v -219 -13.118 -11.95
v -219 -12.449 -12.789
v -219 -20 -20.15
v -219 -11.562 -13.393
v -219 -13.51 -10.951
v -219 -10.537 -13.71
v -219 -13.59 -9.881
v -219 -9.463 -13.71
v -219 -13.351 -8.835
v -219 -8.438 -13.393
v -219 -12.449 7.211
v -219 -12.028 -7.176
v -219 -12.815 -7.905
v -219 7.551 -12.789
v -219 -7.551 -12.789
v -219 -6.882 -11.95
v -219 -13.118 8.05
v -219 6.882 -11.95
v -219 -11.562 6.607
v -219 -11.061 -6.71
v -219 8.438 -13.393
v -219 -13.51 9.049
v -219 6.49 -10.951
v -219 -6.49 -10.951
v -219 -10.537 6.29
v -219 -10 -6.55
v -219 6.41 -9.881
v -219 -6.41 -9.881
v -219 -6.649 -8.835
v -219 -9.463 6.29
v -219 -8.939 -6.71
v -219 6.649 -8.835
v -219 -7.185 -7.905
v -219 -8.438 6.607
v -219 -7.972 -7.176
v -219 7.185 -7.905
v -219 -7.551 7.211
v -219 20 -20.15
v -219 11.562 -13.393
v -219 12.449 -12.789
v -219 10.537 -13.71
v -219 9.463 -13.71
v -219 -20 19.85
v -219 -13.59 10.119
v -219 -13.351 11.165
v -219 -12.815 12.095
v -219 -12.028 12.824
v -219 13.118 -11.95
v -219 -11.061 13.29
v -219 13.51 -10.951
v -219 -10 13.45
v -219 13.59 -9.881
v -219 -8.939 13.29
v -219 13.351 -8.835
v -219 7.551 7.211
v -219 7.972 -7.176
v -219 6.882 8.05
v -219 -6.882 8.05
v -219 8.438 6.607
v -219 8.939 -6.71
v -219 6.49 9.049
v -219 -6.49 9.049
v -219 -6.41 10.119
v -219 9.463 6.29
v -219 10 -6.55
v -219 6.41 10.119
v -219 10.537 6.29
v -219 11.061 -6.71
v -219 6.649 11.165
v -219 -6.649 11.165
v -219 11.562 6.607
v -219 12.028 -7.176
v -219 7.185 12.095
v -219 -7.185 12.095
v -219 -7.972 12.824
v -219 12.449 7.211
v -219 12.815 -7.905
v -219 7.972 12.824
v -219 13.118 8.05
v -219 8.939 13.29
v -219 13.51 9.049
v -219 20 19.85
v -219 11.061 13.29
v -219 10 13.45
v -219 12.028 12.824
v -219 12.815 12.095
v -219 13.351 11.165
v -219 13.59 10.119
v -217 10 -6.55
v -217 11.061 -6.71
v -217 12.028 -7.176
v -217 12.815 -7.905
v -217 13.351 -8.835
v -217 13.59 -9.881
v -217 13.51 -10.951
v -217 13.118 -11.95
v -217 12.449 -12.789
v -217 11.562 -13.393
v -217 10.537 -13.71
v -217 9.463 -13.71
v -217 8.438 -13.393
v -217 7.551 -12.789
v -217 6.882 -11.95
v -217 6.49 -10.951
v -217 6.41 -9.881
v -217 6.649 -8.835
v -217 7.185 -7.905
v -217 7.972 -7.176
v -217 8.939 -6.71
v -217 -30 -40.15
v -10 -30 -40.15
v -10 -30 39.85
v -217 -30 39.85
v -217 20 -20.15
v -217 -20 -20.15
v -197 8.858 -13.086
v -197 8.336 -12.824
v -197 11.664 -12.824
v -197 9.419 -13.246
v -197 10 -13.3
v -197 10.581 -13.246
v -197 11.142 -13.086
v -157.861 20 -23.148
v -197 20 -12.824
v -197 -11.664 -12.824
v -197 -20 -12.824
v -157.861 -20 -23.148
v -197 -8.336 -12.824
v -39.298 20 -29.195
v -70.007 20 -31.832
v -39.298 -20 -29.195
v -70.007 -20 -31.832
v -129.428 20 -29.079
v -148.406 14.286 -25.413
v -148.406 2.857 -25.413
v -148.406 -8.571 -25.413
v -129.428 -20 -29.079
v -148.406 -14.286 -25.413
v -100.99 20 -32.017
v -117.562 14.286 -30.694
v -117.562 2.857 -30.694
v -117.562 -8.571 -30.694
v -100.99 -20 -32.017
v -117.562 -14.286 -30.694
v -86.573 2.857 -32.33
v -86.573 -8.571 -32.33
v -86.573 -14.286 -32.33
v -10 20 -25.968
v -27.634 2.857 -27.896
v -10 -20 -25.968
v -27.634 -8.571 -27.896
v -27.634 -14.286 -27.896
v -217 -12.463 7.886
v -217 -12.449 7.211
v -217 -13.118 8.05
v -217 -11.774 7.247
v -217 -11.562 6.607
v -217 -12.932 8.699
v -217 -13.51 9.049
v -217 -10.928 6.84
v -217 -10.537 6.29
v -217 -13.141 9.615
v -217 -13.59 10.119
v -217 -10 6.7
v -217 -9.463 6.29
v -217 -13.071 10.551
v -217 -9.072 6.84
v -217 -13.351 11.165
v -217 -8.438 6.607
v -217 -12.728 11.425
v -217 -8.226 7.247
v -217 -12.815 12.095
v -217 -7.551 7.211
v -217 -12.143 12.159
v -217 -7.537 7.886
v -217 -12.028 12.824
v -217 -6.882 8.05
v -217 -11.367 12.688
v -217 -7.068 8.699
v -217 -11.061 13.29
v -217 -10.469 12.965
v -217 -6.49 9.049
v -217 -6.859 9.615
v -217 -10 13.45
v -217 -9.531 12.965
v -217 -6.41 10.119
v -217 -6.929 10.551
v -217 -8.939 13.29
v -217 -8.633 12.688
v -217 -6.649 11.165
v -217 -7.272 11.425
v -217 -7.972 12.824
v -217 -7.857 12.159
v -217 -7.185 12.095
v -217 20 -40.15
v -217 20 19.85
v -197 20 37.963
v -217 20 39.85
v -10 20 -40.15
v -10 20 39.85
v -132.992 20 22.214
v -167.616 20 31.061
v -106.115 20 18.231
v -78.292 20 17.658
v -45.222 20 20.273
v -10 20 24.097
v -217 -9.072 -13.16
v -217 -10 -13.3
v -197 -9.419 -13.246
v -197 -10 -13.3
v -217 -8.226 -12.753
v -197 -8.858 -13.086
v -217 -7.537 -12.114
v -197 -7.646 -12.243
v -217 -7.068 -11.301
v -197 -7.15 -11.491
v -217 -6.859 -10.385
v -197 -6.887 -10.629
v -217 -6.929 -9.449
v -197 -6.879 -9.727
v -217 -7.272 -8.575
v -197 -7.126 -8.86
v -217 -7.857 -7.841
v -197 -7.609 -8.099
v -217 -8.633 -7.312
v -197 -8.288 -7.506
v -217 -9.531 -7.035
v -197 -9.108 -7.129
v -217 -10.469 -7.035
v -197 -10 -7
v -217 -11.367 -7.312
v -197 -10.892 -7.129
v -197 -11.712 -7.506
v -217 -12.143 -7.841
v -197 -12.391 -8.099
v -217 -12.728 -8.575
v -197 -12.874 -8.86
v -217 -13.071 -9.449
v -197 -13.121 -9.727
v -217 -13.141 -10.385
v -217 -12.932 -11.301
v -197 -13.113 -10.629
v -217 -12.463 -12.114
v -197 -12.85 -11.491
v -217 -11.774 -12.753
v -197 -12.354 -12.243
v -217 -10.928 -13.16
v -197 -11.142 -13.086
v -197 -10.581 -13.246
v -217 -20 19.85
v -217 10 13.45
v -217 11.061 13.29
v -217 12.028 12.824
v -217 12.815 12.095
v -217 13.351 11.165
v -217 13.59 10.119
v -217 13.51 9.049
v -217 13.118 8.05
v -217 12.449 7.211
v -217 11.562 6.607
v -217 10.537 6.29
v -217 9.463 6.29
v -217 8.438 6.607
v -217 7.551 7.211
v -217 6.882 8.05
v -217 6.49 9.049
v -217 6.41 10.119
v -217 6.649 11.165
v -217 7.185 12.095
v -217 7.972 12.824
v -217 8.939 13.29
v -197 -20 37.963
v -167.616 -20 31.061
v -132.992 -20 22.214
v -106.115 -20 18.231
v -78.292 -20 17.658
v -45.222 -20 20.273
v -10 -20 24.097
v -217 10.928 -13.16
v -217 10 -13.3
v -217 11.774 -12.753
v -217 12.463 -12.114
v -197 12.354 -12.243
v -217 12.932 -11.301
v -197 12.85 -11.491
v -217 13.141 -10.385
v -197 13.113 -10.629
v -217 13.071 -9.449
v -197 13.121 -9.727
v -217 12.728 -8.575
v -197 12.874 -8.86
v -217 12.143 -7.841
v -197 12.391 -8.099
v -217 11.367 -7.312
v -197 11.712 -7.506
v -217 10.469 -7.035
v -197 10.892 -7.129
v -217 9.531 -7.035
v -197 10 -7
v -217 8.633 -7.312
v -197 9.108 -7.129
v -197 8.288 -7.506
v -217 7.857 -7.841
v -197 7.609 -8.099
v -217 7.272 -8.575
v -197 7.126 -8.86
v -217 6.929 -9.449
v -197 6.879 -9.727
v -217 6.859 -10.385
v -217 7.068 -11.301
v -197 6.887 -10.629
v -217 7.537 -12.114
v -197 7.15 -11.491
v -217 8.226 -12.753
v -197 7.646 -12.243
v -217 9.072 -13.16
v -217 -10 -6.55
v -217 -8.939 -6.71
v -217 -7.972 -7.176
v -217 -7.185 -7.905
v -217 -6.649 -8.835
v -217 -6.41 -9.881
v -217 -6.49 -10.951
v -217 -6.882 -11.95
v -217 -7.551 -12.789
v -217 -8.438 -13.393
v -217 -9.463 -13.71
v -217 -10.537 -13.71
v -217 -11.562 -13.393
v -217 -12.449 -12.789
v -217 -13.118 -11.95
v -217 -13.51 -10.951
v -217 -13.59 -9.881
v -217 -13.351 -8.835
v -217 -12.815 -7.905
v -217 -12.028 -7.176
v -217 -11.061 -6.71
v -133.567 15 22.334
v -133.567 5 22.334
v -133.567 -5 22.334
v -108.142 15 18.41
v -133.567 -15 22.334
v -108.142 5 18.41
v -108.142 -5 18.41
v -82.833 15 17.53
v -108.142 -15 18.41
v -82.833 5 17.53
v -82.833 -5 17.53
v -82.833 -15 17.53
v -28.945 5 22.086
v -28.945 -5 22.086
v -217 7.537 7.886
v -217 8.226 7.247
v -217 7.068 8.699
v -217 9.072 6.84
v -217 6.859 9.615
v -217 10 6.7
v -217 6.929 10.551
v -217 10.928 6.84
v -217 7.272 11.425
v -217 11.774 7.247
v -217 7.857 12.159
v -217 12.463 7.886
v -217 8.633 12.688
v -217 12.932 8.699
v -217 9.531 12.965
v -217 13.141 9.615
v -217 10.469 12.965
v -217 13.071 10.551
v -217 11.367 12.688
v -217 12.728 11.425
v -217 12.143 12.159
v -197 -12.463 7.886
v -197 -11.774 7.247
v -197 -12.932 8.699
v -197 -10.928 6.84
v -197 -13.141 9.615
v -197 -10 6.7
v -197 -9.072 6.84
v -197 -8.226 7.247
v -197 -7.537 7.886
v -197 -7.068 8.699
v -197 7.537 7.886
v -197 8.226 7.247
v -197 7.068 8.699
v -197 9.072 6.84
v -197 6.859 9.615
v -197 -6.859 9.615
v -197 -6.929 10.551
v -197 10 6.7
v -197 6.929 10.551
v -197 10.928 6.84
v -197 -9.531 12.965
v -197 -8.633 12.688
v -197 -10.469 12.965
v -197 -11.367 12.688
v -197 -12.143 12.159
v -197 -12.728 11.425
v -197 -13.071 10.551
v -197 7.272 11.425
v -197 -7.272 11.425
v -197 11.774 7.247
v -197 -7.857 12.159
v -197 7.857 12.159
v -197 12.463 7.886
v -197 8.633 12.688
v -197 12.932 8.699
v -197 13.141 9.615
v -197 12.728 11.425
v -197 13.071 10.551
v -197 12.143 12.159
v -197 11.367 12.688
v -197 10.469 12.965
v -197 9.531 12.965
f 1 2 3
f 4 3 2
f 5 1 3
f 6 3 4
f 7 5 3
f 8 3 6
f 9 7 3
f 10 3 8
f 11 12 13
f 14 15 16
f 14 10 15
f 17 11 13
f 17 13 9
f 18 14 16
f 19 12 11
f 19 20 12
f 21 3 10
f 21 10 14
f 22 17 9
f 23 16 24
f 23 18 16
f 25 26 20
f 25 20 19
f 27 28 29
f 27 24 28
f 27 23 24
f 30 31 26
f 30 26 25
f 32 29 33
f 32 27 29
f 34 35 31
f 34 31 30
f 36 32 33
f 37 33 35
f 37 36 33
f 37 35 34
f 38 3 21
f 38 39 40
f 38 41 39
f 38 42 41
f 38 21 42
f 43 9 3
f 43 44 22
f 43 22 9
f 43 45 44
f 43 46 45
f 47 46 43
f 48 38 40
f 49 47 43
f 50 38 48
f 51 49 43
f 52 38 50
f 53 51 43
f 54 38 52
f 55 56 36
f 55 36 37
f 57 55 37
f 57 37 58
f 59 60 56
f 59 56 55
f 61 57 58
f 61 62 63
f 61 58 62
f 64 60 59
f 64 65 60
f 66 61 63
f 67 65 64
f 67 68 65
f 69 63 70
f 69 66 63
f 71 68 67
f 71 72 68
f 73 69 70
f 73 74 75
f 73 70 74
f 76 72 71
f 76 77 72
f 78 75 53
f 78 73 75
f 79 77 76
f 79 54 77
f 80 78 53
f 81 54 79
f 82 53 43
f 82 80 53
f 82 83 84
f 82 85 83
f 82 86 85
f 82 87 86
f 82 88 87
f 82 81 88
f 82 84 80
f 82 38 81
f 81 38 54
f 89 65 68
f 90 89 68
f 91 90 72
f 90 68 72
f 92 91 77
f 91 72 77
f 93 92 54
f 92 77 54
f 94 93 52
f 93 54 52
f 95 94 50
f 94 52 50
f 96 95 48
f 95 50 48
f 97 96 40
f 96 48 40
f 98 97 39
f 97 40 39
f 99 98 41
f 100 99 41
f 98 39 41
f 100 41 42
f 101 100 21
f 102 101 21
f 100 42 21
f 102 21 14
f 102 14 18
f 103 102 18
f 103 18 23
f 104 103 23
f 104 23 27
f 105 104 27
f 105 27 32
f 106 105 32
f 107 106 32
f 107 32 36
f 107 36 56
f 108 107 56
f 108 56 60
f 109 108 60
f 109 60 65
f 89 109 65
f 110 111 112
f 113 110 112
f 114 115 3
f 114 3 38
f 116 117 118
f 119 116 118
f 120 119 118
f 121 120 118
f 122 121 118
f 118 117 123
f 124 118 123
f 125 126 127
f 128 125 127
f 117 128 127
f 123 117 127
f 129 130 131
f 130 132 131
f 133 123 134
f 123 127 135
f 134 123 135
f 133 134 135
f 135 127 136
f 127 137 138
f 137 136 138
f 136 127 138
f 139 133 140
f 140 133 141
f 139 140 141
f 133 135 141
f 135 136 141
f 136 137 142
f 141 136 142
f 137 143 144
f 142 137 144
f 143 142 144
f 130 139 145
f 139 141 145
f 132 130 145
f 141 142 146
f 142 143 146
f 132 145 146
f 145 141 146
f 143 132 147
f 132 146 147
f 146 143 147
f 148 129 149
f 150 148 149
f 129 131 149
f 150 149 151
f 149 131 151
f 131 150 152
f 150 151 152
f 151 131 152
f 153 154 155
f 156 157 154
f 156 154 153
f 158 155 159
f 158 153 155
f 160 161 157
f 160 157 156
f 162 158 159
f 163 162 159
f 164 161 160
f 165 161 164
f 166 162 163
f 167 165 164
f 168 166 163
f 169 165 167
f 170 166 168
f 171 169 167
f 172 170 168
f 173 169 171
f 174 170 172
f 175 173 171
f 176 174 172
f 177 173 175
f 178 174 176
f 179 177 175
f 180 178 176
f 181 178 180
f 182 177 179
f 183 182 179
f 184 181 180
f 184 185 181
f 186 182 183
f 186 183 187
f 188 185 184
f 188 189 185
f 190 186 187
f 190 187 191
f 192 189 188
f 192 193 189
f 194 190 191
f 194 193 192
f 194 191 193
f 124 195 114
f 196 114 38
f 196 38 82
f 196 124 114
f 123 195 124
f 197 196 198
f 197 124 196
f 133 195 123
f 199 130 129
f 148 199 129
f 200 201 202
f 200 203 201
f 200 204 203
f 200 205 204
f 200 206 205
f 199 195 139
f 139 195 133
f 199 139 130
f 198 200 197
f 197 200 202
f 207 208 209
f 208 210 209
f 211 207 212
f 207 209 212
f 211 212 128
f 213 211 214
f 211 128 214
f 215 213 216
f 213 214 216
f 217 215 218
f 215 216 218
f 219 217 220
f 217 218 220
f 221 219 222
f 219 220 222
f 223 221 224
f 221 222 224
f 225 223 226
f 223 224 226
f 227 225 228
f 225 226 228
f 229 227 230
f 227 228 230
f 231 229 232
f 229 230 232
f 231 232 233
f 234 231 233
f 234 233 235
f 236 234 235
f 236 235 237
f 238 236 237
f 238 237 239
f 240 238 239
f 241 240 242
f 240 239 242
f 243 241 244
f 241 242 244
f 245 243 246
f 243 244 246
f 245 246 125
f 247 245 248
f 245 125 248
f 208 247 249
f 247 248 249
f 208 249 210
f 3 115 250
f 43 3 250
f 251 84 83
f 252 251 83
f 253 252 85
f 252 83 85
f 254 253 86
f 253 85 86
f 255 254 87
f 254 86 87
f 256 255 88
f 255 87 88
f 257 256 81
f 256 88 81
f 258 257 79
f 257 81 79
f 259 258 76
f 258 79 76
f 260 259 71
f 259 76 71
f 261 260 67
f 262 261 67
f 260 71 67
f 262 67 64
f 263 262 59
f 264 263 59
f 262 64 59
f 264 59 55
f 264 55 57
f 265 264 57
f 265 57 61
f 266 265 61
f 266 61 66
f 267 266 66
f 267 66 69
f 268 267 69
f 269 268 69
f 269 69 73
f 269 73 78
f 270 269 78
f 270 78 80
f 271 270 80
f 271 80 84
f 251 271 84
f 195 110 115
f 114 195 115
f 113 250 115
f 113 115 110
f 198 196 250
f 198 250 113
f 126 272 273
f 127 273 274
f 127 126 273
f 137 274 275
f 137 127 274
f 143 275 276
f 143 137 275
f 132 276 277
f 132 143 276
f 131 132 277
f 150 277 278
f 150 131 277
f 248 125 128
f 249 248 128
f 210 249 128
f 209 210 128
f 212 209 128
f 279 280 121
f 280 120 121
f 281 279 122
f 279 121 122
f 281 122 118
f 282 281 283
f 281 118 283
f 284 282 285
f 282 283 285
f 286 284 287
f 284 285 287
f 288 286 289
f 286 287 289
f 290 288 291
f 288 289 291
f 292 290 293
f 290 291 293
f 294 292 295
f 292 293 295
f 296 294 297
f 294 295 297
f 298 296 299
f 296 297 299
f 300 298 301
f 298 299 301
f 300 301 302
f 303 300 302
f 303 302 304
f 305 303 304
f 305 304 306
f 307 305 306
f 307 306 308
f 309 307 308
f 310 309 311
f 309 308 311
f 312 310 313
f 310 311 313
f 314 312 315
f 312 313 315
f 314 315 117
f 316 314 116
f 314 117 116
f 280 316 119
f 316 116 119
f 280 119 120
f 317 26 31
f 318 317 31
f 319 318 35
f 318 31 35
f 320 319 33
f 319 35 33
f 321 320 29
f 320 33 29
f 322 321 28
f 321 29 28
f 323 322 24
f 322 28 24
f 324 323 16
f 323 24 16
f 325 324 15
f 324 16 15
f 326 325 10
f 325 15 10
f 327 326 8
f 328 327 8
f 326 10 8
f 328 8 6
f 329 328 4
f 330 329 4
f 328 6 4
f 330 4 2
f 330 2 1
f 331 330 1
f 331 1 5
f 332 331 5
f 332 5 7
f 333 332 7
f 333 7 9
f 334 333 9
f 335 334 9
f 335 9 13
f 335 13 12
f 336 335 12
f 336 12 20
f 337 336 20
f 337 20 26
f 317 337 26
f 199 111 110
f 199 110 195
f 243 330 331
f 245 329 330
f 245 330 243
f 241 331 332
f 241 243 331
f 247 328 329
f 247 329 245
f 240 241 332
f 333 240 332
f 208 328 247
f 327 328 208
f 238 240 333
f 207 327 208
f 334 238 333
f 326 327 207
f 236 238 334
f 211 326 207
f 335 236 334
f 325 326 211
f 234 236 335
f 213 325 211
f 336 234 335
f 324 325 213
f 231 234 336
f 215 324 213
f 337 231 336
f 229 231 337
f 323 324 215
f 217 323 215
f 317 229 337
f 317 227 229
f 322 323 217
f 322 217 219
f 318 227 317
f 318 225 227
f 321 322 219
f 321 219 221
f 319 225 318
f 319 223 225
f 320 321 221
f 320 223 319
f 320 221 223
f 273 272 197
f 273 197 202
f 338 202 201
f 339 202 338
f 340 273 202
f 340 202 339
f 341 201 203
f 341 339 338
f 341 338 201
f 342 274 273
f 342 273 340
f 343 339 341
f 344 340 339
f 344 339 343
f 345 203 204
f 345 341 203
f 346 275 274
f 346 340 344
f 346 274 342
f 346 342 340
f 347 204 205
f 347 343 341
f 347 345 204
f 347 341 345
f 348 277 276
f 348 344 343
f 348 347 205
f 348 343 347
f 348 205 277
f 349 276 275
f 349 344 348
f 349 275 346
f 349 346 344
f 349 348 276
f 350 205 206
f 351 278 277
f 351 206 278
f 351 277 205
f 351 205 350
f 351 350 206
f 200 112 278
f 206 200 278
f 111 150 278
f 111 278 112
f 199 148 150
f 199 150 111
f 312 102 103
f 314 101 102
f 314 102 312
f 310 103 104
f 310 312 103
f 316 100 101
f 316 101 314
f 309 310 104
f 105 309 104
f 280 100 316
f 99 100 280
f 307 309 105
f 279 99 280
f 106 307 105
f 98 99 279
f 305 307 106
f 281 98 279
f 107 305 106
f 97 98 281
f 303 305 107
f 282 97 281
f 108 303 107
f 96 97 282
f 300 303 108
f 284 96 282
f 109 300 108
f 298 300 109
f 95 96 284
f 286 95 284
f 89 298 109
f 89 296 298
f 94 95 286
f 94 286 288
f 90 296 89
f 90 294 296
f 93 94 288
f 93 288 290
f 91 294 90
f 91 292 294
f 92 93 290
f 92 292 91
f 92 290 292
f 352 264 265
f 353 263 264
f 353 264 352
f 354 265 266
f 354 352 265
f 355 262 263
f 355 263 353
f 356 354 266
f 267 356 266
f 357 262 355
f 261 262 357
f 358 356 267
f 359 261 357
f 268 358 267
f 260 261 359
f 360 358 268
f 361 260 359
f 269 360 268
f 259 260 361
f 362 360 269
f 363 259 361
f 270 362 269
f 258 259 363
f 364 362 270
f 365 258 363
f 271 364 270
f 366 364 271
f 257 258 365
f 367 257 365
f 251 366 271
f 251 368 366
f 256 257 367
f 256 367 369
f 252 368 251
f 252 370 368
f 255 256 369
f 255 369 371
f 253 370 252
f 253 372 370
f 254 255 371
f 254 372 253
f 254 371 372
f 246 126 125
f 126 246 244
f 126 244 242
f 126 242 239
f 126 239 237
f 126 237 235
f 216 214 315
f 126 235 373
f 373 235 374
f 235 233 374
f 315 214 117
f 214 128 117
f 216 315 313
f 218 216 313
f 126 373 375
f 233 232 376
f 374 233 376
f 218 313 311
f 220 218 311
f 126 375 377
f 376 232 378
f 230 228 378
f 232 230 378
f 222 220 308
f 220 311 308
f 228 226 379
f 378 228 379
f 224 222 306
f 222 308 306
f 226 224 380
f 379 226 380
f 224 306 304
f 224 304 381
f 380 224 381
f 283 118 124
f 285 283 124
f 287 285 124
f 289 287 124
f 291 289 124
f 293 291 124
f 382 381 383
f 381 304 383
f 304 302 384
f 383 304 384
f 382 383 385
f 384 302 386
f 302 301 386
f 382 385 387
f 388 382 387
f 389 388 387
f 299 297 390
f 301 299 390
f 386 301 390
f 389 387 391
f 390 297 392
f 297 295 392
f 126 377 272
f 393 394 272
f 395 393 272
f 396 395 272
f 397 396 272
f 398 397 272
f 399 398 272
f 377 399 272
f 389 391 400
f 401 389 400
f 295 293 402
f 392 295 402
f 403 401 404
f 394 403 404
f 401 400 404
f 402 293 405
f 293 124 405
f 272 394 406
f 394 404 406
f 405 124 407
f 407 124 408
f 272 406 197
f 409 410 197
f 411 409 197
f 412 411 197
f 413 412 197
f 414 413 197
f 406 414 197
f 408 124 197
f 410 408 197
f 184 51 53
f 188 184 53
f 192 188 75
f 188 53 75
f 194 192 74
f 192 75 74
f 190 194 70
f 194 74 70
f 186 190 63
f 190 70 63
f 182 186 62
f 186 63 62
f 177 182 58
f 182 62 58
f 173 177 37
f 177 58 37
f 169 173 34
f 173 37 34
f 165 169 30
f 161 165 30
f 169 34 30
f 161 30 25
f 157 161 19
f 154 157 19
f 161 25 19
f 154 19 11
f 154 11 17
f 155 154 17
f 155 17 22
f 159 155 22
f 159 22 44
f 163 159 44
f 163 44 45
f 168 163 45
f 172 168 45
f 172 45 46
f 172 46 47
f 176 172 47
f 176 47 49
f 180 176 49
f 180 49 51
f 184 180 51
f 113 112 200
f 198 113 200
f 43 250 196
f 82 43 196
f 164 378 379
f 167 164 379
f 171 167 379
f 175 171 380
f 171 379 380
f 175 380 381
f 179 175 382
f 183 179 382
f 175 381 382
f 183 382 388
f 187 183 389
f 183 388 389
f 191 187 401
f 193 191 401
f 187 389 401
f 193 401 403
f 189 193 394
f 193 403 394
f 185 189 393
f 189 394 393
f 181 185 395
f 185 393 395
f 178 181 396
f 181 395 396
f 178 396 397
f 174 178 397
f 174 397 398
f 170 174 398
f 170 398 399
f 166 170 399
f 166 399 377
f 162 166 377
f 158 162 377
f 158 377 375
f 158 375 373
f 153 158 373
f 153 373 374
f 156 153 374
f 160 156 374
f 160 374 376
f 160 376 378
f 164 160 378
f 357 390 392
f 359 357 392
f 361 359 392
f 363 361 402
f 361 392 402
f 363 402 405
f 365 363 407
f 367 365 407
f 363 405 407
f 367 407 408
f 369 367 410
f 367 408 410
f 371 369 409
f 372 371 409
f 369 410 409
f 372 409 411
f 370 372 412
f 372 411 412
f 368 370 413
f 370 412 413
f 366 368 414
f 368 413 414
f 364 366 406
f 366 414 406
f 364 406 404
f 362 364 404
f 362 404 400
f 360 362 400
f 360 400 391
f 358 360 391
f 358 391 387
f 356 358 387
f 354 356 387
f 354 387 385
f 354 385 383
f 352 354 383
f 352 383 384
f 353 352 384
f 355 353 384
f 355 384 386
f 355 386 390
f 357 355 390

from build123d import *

# Parameters (mm, degrees)
BOSS_EXTRUDE1_DEPTH      = 20
BOSS_EXTRUDE1_DEPTH_BACK = 30
CUT_SWEEP1_START         = -20
CUT_SWEEP1_DEPTH         = 40
SKETCH10_W               = 80
SKETCH10_H               = 50
BOSS_EXTRUDE2_DEPTH      = 20
SKETCH16_W               = 40
SKETCH16_H               = 40
BOSS_EXTRUDE3_DEPTH      = 2
HOLE2_D                  = 6.3
HOLE2_DEPTH              = 22
HOLE2_CBORE_D            = 7.2
HOLE2_CBORE_DEPTH        = 2
SKETCH21_W               = 80
SKETCH21_H               = 50
CUT_EXTRUDE1_DEPTH       = 10


# Read off the part's stored shape, not the designer's step: Cut-Sweep1
with BuildPart() as part:
    # Sketch4 → Boss-Extrude1 (new, two sides: drawn at the far end of the back side and taken through both)
    with BuildSketch(Plane(origin=(0, 0, 0), x_dir=(1, 0, 0), z_dir=(0, 1, 0)).offset(-BOSS_EXTRUDE1_DEPTH_BACK)):
        with BuildLine():
            Line((0, 40.15), (-197, 40.15))
            Line((-197, 40.15), (-197, -12.476031535))
            add(Edge.make_bspline(
                [(-197, -12.476031535), (-157.6, -4.723053252), (-118.2, 15.300441144), (-78.8, 10.012115501), (-39.4, 3.538400001), (0, 0.15)],
                knots=[0.083275556, 0.083275556, 0.083275556, 0.083275556, 0.083275556, 0.083275556, 0.916661414, 0.916661414, 0.916661414, 0.916661414, 0.916661414, 0.916661414], degree=5))
            Line((0, 0.15), (0, 40.15))
        make_face()
        with BuildLine():
            add(Edge.make_bspline(
                [(-197, -12.476031535), (-157.6, -4.723053252), (-118.2, 15.300441144), (-78.8, 10.012115501), (-39.4, 3.538400001), (0, 0.15)],
                knots=[0.083275556, 0.083275556, 0.083275556, 0.083275556, 0.083275556, 0.083275556, 0.916661414, 0.916661414, 0.916661414, 0.916661414, 0.916661414, 0.916661414], degree=5))
            Line((-197, -12.476031535), (-197, -39.85))
            Line((-197, -39.85), (0, -39.85))
            Line((0, -39.85), (0, 0.15))
        make_face()
    extrude(amount=BOSS_EXTRUDE1_DEPTH + BOSS_EXTRUDE1_DEPTH_BACK)

    # Cut-Sweep1 outline → Cut-Sweep1 (cut)
    with BuildSketch(Plane(origin=(0, 0, 0), x_dir=(1, 0, 0), z_dir=(0, 1, 0)).offset(CUT_SWEEP1_START)):
        with BuildLine():
            Line((-197, 12.824466259), (-197, -37.963170516))
            add(Edge.make_bspline(
                [(-197, -37.963170516), (-194.857076562, -37.593469155), (-192.664183232, -37.185688204), (-179.694008515, -34.512721603), (-169.755793181, -31.636726837), (-151.13880736, -26.524050167), (-142.164701345, -24.14456221), (-124.9697813, -20.524403523), (-116.494315107, -19.189461235), (-99.789682062, -17.631352392), (-91.362774073, -17.362930945), (-74.303075644, -17.69764349), (-65.556432968, -18.288800586), (-47.620430646, -19.955725203), (-38.405272349, -21.025808689), (-19.484749512, -23.146908776), (-9.824169485, -24.188286581), (0, -25)],
                knots=[0.098511652, 0.098511652, 0.098511652, 0.098511652, 0.124429736, 0.124429736, 0.248859471, 0.248859471, 0.373289207, 0.373289207, 0.497718942, 0.497718942, 0.622148678, 0.622148678, 0.746578413, 0.746578413, 0.871008149, 0.871008149, 0.995437884, 0.995437884, 0.995437884, 0.995437884], degree=3))
            Line((0, -25), (0, 25))
            add(Edge.make_bspline(
                [(-197, 12.824466259), (-190.953867766, 14.201157707), (-184.535853215, 15.951619244), (-168.3474788, 20.421519224), (-158.563360814, 23.118034358), (-138.248185708, 27.707878723), (-127.968743149, 29.521030359), (-107.155965698, 31.867257342), (-96.8180132, 32.368349134), (-76.327105621, 32.290986848), (-66.286644699, 31.713382561), (-46.616831507, 30.041717947), (-37.012970151, 28.954868939), (-18.255380676, 26.838041894), (-9.05748306, 25.811713394), (0, 25)],
                knots=[0.160277357, 0.160277357, 0.160277357, 0.160277357, 0.248859471, 0.248859471, 0.373289207, 0.373289207, 0.497718942, 0.497718942, 0.622148678, 0.622148678, 0.746578413, 0.746578413, 0.871008149, 0.871008149, 0.995437884, 0.995437884, 0.995437884, 0.995437884], degree=3))
        make_face()
    extrude(amount=CUT_SWEEP1_DEPTH, mode=Mode.SUBTRACT)

    # Sketch10 → Boss-Extrude2 (add)
    with BuildSketch(Plane.ZY.offset(197)):
        with Locations((-0.15, -5)):
            Rectangle(SKETCH10_W, SKETCH10_H)
    extrude(amount=BOSS_EXTRUDE2_DEPTH)

    # Sketch16 → Boss-Extrude3 (add)
    with BuildSketch(Plane.ZY.offset(217)):
        with Locations((-0.15, 0)):
            Rectangle(SKETCH16_W, SKETCH16_H)
    extrude(amount=BOSS_EXTRUDE3_DEPTH)

    # Hole2
    with Locations(Plane.ZY.offset(219)):
        with Locations((-10.15, 10), (9.85, 10), (-10.15, -10), (9.85, -10)):
            CounterBoreHole(HOLE2_D / 2, HOLE2_CBORE_D / 2, HOLE2_CBORE_DEPTH, depth=HOLE2_DEPTH)

    # Sketch21 → Cut-Extrude1 (cut)
    with BuildSketch(Plane(origin=(0, 0, 0), x_dir=(0, 0, -1), z_dir=(1, 0, 0))):
        with Locations((0.15, -5)):
            Rectangle(SKETCH21_W, SKETCH21_H)
    extrude(amount=-CUT_EXTRUDE1_DEPTH, mode=Mode.SUBTRACT)


solid = part.part
